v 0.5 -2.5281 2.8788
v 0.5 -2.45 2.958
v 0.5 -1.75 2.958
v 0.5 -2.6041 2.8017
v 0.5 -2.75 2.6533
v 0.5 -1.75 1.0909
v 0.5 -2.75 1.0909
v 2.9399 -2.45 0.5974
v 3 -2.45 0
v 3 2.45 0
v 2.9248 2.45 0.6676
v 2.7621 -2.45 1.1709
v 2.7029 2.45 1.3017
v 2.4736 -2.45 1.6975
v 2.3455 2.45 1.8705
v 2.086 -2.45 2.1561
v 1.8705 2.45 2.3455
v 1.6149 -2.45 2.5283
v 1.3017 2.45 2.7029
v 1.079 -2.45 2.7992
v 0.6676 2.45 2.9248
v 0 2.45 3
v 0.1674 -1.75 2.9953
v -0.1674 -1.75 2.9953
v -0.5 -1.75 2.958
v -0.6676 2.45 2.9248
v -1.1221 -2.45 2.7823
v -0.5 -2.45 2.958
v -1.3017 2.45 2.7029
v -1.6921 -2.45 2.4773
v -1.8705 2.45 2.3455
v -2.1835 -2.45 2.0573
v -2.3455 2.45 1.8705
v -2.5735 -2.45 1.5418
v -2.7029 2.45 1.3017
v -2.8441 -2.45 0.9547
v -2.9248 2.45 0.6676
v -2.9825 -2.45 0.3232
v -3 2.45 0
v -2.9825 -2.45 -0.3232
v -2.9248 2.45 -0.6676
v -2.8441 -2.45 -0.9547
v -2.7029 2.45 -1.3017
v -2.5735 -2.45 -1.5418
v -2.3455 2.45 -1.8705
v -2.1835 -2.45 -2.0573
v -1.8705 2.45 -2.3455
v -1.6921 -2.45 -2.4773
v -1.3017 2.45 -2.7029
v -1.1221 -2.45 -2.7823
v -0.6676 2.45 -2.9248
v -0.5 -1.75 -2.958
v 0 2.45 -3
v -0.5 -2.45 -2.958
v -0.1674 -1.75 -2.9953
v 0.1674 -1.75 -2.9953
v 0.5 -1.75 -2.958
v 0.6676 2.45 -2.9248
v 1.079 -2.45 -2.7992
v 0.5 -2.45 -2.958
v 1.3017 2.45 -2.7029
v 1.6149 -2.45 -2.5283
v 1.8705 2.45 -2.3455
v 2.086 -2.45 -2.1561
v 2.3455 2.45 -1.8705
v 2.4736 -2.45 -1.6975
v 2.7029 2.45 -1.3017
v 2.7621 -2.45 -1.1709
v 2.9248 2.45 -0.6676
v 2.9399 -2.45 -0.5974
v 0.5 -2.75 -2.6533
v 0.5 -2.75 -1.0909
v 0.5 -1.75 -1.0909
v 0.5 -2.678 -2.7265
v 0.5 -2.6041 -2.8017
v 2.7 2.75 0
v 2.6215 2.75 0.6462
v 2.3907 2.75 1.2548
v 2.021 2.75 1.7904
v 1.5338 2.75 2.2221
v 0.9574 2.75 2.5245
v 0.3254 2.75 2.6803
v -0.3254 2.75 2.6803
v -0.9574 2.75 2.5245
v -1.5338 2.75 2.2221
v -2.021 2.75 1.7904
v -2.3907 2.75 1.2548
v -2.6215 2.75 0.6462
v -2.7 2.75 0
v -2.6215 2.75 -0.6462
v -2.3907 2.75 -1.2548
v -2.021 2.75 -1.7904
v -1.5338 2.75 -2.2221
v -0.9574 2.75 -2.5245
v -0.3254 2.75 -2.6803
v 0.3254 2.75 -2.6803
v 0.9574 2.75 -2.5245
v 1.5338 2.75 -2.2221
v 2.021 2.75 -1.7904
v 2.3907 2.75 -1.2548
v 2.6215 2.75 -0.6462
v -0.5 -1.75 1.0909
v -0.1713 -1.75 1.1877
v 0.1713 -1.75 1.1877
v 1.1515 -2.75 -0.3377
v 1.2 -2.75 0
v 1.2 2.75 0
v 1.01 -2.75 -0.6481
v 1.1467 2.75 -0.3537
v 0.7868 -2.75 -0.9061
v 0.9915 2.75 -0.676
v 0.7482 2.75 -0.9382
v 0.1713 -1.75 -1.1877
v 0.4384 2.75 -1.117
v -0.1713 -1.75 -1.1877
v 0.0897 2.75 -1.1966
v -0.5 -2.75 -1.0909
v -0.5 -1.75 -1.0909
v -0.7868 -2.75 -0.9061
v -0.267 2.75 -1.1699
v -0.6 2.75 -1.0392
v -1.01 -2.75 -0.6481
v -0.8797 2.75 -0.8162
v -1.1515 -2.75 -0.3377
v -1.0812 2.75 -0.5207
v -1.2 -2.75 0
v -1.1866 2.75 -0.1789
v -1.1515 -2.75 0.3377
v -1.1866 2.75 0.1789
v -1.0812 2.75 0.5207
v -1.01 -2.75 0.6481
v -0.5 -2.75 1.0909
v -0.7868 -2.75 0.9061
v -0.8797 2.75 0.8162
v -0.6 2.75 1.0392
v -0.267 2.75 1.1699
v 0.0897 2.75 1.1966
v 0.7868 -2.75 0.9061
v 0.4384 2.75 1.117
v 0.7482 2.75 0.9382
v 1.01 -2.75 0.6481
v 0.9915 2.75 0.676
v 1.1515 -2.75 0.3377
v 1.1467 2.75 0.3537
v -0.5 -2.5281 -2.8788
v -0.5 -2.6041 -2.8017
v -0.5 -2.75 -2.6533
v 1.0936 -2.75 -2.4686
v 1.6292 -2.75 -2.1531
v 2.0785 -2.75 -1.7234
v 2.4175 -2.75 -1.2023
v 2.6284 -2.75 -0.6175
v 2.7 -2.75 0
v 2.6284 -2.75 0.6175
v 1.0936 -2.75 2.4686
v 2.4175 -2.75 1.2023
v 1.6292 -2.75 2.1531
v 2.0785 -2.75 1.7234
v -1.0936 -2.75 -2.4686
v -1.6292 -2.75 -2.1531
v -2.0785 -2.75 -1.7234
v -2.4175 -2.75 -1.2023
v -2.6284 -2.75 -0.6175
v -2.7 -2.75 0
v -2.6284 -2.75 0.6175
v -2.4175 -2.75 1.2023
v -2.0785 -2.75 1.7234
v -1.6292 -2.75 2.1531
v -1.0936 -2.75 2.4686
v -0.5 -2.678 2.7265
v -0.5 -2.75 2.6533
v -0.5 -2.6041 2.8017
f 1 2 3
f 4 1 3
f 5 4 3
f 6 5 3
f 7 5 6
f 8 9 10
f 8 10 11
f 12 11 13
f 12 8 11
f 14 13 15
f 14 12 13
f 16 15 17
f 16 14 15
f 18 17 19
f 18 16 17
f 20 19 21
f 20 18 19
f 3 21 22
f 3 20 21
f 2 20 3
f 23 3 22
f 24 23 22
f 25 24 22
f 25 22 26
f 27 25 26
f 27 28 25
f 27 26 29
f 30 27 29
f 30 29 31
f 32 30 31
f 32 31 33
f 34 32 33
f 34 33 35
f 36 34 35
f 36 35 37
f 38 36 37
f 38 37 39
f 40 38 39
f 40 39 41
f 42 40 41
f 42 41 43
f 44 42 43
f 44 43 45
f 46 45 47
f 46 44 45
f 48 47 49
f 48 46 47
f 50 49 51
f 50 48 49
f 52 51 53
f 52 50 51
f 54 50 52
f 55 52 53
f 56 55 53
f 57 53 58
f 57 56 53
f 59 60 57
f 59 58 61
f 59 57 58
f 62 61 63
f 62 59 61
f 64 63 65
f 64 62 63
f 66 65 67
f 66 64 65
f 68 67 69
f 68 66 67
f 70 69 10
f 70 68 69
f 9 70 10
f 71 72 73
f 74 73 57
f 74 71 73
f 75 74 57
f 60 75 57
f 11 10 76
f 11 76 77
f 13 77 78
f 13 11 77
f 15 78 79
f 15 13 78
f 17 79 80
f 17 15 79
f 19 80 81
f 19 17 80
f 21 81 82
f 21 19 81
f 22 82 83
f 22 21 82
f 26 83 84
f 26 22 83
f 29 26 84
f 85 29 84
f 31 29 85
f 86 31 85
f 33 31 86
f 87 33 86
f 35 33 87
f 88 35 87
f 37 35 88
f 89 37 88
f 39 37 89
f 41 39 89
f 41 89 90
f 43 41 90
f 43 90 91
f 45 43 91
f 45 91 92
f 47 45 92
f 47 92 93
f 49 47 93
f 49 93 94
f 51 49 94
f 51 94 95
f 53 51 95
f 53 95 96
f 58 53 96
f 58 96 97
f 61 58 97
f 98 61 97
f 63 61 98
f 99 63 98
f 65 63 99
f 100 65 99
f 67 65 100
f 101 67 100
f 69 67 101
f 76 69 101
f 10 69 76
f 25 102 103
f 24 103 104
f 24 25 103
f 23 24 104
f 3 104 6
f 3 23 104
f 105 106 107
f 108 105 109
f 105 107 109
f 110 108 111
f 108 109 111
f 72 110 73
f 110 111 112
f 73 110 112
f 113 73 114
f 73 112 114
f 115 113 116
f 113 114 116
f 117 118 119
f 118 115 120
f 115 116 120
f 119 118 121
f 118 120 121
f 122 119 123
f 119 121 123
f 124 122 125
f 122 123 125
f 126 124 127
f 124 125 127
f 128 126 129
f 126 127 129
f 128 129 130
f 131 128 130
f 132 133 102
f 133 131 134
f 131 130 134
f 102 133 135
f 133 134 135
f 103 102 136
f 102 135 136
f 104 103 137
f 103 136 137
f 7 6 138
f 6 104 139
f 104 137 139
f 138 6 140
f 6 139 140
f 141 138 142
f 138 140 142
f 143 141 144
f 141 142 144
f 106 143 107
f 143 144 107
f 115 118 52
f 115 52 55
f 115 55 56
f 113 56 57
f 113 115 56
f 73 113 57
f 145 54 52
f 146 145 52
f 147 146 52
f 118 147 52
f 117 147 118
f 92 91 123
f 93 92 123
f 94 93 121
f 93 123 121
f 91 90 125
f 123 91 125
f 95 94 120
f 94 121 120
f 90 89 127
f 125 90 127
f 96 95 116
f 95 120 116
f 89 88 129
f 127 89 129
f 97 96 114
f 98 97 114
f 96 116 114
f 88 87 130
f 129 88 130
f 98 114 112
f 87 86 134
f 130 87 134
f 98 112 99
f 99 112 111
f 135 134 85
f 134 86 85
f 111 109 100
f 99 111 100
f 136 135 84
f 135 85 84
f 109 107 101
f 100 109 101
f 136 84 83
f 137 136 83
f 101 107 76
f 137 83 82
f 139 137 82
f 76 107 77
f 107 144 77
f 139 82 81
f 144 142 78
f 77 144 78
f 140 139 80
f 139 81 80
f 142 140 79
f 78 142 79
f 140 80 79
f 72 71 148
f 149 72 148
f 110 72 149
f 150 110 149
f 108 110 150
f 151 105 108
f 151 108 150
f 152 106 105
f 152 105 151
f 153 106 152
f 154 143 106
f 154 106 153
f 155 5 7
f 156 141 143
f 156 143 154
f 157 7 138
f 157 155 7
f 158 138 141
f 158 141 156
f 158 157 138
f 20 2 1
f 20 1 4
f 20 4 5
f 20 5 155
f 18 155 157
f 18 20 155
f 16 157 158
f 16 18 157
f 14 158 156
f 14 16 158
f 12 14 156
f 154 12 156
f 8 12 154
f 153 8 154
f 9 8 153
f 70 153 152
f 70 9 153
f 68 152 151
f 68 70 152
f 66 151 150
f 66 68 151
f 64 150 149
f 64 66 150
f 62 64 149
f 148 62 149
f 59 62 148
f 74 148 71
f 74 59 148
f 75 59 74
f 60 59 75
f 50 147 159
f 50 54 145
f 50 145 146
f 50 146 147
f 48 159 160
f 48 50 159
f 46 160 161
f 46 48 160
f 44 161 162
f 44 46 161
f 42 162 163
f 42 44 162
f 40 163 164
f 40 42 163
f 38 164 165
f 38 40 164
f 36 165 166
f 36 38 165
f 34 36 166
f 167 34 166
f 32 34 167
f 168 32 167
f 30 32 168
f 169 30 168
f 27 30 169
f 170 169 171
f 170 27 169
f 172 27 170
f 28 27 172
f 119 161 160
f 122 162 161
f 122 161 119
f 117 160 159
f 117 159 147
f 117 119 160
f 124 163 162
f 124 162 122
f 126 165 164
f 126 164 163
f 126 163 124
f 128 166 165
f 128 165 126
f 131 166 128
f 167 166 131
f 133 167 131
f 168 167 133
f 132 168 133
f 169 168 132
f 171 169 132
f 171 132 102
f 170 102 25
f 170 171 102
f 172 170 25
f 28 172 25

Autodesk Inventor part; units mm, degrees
ref_plane "YZ Plane" through (0, 0, 0) normal (1, 0, 0) x (0, 1, 0)
ref_plane "XZ Plane" through (0, 0, 0) normal (0, 1, 0) x (-1, 0, 0)
ref_plane "XY Plane" through (0, 0, 0) normal (0, 0, 1) x (1, 0, 0)
sketch "スケッチ1" plane through (0, 0, 0) normal (0, 0, 1) x (1, 0, 0)
  line L0 (1.2, -2.75) -> (1.2, 2.75)
  line L1 (1.2, 2.75) -> (2.7, 2.75)
  line L2 (2.7, 2.75) -> (3, 2.45)
  line L3 (3, 2.45) -> (3, -2.45)
  line L4 (0, 6.6667) -> (0, -6.6667) construction
  line L5 (3, -2.45) -> (2.7, -2.75)
  line L6 (2.7, -2.75) -> (1.2, -2.75)
  point P0 (0, 0)
  point P1 (0, 0)
  point P2 (1.2, 0)
  point P3 (3, 0)
  dimension "d0" = 6
  dimension "d1" = 2.4
  dimension "d3" = 5.5
  dimension "d4" = 0.3
  dimension "d5" = 0.3
revolve "回転1" add sketch "スケッチ1" angle 360 about axis through (0, 6.6667, 0) along (0, -1, 0)
sketch "スケッチ2" plane through (0, -2.75, 0) normal (0, -1, 0) x (1, 0, 0)
  line L0 (-0.5, 3) -> (0.5, 3)
  line L1 (0.5, 3) -> (0.5, -3)
  line L2 (0.5, -3) -> (-0.5, -3)
  line L3 (-0.5, -3) -> (-0.5, 3)
  line L4 (-0.5, 3) -> (0.5, -3) construction
  line L5 (0.5, 3) -> (-0.5, -3) construction
  point P0 (0, 0)
  dimension "d7" = 1
  dimension "d8" = 6
extrude "押し出し1" cut sketch "スケッチ2" against normal blind 1
equation "\"d5\" = d4"
properties part number "ARU-304S" material "ステンレス鋼 440C"
